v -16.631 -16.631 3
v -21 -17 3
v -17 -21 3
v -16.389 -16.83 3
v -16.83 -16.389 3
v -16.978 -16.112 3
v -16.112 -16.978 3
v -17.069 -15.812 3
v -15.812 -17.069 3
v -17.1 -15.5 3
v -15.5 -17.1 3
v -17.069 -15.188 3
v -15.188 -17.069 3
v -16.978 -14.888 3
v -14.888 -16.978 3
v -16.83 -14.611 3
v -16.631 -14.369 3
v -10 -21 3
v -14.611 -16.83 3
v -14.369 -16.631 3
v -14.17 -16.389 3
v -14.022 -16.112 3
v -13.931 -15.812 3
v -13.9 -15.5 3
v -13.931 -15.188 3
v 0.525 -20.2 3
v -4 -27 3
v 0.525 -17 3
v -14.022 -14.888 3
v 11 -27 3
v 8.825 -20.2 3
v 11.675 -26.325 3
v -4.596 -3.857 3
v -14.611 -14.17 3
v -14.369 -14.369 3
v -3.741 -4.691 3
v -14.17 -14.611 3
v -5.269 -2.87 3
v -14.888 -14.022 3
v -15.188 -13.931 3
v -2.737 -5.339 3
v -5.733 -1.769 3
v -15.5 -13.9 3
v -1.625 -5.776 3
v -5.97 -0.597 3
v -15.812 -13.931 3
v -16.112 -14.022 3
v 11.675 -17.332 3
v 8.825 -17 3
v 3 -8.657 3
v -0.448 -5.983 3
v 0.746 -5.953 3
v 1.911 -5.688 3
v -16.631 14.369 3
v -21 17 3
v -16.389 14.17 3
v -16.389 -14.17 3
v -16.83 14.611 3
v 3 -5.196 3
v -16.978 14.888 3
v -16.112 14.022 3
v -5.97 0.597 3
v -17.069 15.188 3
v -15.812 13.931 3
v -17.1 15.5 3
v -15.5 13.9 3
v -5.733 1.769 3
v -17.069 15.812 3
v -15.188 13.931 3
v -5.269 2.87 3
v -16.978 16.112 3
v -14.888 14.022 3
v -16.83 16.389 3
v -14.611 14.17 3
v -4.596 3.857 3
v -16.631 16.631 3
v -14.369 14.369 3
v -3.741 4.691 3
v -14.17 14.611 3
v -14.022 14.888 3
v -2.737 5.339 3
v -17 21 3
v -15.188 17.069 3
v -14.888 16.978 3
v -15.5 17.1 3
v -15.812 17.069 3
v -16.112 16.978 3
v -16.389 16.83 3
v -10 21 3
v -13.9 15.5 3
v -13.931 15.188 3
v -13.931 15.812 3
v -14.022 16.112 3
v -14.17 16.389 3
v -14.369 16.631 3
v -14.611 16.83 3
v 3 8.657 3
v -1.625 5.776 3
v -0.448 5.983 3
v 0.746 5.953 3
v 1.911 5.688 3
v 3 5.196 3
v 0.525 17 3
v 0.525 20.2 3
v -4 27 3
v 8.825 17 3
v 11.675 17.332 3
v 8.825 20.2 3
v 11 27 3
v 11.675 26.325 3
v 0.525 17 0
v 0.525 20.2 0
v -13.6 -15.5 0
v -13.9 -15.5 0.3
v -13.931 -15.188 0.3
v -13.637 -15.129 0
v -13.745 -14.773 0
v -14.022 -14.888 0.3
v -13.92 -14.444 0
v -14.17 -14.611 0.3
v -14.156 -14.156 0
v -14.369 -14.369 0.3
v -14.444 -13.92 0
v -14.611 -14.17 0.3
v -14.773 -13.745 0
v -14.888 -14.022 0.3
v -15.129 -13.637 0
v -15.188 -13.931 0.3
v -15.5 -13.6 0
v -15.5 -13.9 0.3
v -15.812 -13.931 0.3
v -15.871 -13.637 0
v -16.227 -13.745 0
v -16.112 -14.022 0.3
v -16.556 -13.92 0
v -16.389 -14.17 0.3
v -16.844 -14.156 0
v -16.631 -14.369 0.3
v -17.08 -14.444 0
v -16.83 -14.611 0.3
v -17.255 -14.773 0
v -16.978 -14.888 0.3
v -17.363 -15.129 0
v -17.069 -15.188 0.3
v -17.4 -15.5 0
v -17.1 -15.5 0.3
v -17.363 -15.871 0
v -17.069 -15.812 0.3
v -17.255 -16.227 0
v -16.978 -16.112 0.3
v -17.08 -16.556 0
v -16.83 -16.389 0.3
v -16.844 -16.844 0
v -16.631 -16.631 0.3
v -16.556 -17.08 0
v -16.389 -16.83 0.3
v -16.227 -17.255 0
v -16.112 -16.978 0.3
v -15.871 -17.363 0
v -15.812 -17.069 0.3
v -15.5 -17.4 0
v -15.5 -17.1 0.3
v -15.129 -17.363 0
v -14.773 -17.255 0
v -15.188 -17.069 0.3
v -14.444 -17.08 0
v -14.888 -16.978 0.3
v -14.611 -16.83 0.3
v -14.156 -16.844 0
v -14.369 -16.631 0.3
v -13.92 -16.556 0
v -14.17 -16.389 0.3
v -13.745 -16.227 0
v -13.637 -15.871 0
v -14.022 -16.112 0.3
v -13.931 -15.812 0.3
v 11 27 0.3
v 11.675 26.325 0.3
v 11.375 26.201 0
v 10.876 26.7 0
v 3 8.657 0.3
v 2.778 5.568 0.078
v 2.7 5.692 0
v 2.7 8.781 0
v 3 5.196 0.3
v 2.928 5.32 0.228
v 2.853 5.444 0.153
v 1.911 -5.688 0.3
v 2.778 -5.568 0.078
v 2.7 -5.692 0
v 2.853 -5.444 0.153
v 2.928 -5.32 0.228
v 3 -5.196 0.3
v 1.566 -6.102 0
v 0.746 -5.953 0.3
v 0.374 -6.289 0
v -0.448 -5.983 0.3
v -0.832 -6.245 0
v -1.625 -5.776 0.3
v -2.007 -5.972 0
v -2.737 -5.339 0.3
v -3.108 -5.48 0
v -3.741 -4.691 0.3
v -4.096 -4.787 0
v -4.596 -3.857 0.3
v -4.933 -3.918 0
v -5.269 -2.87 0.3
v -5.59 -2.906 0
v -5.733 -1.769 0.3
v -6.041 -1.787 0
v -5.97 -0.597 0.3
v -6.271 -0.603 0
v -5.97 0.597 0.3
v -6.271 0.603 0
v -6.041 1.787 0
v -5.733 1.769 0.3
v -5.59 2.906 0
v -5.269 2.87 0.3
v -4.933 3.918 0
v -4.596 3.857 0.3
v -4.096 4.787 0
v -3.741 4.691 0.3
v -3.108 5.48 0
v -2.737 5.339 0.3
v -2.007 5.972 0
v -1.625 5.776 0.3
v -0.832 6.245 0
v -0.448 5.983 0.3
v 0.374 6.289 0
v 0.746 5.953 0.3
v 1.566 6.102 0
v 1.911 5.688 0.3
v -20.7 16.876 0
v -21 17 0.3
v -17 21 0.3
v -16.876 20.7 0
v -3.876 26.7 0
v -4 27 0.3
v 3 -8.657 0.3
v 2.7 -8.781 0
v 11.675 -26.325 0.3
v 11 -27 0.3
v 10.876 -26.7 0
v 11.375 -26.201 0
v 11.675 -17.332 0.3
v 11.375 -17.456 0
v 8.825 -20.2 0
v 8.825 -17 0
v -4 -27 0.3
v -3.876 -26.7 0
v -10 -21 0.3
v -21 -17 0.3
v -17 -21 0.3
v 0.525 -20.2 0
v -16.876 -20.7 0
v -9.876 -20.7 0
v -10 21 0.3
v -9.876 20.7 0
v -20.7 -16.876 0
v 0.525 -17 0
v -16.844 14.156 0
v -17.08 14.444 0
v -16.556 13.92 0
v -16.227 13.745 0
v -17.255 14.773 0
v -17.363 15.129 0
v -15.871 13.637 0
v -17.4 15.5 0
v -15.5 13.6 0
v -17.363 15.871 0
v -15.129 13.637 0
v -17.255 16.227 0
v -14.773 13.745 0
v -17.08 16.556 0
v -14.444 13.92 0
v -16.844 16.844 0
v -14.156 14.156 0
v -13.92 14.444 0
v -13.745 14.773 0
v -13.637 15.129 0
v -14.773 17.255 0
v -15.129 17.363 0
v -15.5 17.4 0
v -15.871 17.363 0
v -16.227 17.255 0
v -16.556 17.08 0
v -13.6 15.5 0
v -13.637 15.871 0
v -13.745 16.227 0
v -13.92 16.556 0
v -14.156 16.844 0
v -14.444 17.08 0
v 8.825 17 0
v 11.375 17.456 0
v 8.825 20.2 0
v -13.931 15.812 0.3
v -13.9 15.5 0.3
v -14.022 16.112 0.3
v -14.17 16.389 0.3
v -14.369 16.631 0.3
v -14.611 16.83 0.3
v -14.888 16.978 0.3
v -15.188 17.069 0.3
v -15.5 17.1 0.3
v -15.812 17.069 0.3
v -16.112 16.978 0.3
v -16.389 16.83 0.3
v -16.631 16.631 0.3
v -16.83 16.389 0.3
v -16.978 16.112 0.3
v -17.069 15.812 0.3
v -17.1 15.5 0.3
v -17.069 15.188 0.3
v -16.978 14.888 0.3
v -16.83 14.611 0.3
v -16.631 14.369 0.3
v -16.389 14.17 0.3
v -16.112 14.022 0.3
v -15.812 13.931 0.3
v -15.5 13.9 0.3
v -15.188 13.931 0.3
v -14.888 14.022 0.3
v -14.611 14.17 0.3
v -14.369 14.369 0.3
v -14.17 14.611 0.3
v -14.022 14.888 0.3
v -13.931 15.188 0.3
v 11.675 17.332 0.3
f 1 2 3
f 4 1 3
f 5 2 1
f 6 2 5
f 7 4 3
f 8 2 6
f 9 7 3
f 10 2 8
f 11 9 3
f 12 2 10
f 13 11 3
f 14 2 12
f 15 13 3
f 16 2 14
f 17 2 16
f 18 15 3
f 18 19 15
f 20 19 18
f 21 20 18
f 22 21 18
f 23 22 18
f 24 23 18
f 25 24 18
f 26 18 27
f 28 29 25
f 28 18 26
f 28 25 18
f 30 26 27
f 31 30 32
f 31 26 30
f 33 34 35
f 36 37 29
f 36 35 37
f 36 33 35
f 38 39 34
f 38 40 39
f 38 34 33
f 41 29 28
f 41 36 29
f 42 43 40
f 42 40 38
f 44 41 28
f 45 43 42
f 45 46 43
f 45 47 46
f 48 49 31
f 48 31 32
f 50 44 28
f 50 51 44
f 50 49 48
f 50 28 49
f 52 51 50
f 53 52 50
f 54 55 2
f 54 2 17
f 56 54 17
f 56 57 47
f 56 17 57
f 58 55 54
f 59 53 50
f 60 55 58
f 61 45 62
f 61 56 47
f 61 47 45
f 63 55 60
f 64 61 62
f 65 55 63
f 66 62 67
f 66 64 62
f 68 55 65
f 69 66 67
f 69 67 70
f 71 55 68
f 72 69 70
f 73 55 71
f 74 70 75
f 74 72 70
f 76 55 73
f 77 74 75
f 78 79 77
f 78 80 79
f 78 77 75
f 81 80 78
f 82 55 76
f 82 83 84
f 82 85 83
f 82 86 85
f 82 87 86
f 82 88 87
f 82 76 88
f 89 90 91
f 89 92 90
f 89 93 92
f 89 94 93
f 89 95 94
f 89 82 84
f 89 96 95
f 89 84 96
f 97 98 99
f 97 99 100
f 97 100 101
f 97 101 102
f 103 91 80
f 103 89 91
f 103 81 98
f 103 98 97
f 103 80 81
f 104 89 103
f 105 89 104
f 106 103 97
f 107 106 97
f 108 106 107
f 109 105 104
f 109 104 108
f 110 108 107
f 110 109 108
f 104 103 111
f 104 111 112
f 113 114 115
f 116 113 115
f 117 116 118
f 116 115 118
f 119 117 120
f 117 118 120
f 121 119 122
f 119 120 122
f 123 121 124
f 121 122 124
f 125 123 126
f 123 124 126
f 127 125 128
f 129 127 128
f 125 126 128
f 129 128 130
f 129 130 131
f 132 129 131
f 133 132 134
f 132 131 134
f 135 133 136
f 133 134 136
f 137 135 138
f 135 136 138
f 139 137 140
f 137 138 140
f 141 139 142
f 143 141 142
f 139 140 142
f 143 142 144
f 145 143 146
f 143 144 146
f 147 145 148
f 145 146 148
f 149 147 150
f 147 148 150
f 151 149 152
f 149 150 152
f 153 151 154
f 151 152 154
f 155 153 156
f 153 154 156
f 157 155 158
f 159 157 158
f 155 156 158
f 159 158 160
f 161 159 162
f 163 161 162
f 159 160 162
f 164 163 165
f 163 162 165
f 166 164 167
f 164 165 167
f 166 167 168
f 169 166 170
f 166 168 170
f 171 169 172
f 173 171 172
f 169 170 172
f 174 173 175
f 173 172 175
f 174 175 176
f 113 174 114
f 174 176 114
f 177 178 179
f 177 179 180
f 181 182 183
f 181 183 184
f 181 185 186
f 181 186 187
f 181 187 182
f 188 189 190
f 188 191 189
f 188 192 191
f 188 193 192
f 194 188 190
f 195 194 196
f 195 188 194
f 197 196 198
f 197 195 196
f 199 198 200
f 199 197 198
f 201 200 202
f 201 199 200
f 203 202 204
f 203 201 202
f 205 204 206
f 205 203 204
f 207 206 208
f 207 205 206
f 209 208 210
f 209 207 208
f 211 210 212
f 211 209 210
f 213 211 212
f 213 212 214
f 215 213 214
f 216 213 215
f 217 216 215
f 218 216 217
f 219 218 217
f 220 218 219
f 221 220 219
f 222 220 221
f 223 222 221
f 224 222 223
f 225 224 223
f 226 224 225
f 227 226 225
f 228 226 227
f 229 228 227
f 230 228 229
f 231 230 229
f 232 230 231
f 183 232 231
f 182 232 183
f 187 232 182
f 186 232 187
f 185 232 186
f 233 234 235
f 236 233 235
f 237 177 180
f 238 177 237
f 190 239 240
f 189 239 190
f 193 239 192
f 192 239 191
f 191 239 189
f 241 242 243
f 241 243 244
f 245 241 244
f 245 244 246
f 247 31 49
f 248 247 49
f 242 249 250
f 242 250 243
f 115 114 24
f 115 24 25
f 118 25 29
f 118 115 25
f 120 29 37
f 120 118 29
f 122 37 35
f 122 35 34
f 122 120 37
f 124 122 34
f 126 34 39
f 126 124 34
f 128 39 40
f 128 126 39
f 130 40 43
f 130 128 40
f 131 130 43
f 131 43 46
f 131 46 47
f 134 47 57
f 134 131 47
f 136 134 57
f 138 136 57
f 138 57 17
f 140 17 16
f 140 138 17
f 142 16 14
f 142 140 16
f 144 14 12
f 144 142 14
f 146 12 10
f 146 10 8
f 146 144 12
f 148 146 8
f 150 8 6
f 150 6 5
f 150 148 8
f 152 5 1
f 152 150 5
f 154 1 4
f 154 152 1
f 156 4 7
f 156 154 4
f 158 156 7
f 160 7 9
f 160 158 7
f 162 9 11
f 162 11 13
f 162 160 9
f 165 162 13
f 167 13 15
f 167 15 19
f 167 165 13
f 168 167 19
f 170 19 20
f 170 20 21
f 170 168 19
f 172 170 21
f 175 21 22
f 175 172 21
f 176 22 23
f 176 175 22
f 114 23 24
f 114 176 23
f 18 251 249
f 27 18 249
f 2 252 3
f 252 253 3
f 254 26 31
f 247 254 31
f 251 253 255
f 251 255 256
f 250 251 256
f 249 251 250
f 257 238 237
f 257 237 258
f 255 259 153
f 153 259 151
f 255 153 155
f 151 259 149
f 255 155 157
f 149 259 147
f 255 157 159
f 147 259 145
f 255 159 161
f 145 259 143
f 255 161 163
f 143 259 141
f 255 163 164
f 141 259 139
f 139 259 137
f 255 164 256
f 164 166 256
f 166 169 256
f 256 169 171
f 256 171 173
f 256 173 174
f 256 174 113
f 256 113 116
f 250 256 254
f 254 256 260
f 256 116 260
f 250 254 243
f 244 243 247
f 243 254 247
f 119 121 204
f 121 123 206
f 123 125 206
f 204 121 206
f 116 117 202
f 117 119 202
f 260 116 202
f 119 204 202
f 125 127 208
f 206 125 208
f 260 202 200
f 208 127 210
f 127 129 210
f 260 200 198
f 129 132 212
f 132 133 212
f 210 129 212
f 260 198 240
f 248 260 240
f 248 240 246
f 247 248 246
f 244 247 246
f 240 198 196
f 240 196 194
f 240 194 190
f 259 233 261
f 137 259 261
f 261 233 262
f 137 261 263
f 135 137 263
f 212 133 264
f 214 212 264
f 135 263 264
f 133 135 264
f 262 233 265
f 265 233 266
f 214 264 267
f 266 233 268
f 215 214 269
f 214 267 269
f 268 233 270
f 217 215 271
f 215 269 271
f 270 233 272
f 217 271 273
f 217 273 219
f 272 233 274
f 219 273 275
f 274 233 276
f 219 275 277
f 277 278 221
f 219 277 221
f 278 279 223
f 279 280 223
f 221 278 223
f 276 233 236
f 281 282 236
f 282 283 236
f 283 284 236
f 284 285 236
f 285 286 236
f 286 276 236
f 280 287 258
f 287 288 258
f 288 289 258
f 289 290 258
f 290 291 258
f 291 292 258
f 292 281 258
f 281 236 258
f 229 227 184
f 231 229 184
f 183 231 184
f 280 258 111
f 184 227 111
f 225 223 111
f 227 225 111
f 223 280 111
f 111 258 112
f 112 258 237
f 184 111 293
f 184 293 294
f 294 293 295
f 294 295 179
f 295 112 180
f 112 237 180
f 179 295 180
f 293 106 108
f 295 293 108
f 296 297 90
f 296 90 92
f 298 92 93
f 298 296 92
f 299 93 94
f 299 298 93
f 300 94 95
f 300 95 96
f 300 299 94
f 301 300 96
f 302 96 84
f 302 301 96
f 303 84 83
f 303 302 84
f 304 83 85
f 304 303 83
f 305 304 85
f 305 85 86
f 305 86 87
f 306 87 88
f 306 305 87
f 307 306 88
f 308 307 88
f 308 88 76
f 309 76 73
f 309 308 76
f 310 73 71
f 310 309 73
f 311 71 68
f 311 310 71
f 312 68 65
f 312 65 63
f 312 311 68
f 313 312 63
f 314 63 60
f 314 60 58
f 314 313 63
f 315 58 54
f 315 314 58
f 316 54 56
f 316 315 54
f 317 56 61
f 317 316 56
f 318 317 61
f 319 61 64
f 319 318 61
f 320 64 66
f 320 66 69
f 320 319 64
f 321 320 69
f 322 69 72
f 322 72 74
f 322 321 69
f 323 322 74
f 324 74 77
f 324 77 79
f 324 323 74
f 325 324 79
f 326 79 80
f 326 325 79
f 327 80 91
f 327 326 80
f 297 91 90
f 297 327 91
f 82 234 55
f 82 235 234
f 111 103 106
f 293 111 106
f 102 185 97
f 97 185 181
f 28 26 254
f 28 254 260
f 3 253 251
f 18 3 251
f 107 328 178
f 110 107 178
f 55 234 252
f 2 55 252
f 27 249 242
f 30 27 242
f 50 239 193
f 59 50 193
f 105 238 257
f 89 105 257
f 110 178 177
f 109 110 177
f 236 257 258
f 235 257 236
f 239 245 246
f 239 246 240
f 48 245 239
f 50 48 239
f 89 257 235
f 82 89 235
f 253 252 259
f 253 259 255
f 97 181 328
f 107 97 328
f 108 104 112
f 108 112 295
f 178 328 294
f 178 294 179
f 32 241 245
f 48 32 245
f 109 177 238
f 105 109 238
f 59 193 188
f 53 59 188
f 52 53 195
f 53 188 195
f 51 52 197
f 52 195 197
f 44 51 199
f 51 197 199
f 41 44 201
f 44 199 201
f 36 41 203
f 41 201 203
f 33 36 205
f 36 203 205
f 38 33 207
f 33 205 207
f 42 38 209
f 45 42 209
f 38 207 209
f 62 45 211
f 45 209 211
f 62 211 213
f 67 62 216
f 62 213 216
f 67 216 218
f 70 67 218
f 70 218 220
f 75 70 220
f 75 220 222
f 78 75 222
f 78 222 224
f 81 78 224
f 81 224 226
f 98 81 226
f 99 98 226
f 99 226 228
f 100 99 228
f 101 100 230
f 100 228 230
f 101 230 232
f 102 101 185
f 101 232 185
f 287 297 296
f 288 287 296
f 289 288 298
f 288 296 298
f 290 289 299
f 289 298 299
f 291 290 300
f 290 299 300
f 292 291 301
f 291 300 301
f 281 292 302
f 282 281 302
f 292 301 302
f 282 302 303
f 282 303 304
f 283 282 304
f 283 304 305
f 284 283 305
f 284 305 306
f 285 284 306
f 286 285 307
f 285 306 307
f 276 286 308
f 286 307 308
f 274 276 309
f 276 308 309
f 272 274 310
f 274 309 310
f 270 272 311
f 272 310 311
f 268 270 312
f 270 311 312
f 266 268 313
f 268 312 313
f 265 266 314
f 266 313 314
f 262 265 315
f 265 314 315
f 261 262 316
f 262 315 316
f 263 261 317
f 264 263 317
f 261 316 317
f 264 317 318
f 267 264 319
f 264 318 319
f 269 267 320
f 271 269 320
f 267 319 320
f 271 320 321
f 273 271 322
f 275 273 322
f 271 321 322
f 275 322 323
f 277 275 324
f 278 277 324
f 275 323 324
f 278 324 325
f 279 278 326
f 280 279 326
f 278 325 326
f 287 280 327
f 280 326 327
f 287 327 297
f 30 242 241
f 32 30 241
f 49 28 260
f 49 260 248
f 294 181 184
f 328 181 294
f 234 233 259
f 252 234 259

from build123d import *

# Parameters (mm, degrees)
SKETCH1_R           = 1.6
BOSS_EXTRUDE1_DEPTH = 3
CHAMFER6_SIZE       = 4
CHAMFER5_SIZE       = 0.3
SKETCH8_W           = 8.3
SKETCH8_H           = 3.2
CUT_EXTRUDE1_DEPTH  = 35.336569427


with BuildPart() as part:
    # Sketch1 → Boss-Extrude1 (new body)
    with BuildSketch(Plane.XY):
        with BuildLine():
            Line((-21, 21), (-21, -21))
            Line((-21, -21), (-10, -21))
            Line((-10, -21), (-4, -27))
            Line((-4, -27), (11, -27))
            Line((11, -27), (11.675, -26.325))
            Line((11.675, -26.325), (11.675, -17.331854249))
            Line((11.675, -17.331854249), (3, -8.656854249))
            Line((3, -8.656854249), (3, -5.196152423))
            ThreePointArc((3, -5.196152423), (-6, 0), (3, 5.196152423))
            Line((3, 5.196152423), (3, 8.656854249))
            Line((3, 8.656854249), (11.675, 17.331854249))
            Line((11.675, 17.331854249), (11.675, 26.325))
            Line((11.675, 26.325), (11, 27))
            Line((11, 27), (-4, 27))
            Line((-4, 27), (-10, 21))
            Line((-10, 21), (-21, 21))
        make_face()
        with Locations((-15.5, -15.5)):
            Circle(SKETCH1_R, mode=Mode.SUBTRACT)
        with Locations((-15.5, 15.5)):
            Circle(SKETCH1_R, mode=Mode.SUBTRACT)
    extrude(amount=BOSS_EXTRUDE1_DEPTH)

    # Chamfer6
    chamfer6_edges = [part.edges().sort_by_distance(p)[0] for p in [
        (-21, -21, 1.5),
        (-21, 21, 1.5),
    ]]
    chamfer(chamfer6_edges, length=CHAMFER6_SIZE)

    # Chamfer5
    chamfer5_edges = [part.edges().sort_by_distance(p)[0] for p in [
        (-7, 24, 0),
        (3.5, 27, 0),
        (11.3375, 26.6625, 0),
        (11.675, 21.828427125, 0),
        (7.3375, 12.994354249, 0),
        (3, 6.926503336, 0),
        (-6, 0, 0),
        (3, -6.926503336, 0),
        (7.3375, -12.994354249, 0),
        (11.675, -21.828427125, 0),
        (11.3375, -26.6625, 0),
        (3.5, -27, 0),
        (-7, -24, 0),
        (-13.5, 21, 0),
        (-17.1, -15.5, 0),
        (-17.1, 15.5, 0),
        (-21, 0, 0),
        (-13.5, -21, 0),
        (-19, -19, 0),
        (-19, 19, 0),
    ]]
    chamfer(chamfer5_edges, length=CHAMFER5_SIZE)

    # Sketch8 → Cut-Extrude1 (cut, through all)
    with BuildSketch(Plane.XY.offset(3)):
        with Locations((4.675, 18.6)):
            Rectangle(SKETCH8_W, SKETCH8_H)
        with Locations((4.675, -18.6)):
            Rectangle(SKETCH8_W, SKETCH8_H)
    extrude(amount=-CUT_EXTRUDE1_DEPTH, mode=Mode.SUBTRACT)


solid = part.part
